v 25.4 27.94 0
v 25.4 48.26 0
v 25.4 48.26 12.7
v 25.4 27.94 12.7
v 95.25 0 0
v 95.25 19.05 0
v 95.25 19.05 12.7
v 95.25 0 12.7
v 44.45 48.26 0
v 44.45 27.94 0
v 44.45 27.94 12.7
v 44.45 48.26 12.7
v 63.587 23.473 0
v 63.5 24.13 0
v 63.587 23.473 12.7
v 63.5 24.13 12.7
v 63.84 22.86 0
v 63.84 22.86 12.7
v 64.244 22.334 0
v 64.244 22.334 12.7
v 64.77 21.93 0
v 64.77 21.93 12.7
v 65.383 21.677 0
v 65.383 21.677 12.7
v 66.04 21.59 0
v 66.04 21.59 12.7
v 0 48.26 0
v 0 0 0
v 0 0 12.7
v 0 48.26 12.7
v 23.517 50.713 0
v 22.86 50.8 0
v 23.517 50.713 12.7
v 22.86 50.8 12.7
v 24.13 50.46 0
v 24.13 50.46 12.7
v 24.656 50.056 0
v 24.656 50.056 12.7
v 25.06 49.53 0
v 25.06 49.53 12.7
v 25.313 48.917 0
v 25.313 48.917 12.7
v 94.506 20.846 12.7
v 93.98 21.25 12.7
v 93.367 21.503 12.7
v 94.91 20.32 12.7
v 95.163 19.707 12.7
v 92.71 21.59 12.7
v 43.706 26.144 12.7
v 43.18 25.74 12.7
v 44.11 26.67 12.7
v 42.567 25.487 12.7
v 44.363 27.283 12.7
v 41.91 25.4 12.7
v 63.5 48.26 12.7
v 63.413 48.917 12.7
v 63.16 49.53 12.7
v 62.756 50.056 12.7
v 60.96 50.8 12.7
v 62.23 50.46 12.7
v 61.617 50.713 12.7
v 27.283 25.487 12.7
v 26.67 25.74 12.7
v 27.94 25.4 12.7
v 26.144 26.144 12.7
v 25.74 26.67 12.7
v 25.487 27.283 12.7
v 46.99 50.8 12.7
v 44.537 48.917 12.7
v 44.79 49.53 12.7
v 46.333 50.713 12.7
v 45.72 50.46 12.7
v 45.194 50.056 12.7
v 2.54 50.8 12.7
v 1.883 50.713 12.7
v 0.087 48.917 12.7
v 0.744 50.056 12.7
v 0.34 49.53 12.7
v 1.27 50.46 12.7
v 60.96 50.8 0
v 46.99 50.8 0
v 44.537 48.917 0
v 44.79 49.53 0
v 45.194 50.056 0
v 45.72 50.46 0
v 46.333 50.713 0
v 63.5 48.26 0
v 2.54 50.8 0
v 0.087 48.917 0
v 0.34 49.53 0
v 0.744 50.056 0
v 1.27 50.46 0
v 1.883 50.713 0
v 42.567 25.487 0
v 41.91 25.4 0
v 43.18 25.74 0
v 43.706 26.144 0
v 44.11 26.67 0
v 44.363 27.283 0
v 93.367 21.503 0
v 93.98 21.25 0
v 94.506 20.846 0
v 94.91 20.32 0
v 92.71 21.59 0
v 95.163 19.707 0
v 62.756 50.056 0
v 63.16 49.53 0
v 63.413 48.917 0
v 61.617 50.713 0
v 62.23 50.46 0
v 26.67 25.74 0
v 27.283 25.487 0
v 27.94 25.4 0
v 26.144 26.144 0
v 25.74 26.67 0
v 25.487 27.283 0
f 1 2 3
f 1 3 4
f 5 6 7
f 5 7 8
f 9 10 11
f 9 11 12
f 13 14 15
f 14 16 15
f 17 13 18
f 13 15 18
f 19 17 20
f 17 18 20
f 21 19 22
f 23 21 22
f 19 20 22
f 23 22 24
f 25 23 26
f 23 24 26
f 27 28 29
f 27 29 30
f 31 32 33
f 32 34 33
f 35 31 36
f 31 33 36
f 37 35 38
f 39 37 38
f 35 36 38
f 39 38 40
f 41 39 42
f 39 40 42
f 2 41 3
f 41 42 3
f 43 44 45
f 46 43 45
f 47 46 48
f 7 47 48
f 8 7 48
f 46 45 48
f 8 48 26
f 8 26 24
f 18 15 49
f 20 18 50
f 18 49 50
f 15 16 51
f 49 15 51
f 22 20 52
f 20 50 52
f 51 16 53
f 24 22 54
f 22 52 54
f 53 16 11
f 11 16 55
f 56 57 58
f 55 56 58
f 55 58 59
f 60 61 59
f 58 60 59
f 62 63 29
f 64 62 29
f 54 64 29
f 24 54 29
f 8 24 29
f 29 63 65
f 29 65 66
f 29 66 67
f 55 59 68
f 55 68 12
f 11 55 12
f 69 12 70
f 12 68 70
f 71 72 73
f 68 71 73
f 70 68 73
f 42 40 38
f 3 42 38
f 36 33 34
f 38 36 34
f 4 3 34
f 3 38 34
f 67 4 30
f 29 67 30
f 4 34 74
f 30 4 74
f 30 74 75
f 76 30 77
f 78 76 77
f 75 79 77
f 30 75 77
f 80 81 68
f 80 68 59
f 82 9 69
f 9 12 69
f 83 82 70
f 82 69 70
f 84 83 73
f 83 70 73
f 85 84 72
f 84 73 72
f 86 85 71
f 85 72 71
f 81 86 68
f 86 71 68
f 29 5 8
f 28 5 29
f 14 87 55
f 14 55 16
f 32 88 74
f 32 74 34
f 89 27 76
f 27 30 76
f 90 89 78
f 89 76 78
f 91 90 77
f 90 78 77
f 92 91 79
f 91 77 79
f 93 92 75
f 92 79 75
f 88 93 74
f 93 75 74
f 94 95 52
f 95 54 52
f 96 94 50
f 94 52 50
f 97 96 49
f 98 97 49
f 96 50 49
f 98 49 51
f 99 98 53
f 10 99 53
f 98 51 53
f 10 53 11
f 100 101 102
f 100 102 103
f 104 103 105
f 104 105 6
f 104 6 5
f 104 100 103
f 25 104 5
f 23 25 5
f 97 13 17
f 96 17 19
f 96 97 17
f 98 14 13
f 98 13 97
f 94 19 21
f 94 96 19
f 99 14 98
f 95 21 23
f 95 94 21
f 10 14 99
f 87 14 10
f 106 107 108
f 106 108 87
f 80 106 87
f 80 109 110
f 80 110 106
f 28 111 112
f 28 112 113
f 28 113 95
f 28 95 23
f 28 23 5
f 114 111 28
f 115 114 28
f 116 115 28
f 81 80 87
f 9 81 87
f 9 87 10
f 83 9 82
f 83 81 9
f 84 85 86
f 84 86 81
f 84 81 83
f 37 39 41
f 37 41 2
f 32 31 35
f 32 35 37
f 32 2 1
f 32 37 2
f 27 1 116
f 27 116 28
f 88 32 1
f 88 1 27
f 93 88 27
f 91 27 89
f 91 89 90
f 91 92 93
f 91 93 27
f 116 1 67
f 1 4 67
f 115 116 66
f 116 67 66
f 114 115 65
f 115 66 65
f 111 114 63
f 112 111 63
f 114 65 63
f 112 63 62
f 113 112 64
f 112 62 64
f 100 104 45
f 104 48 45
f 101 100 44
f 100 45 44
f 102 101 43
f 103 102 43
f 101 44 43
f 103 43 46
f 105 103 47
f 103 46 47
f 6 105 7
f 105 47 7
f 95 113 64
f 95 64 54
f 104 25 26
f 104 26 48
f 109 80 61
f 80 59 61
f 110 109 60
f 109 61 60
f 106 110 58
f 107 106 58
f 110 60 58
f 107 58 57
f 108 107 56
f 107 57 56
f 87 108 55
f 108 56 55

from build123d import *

# Parameters (mm, degrees)
BOSS_EXTRUDE1_DEPTH = 12.7
FILLET1_R           = 2.54


with BuildPart() as part:
    # Sketch1 → Boss-Extrude1 (new body)
    with BuildSketch(Plane.XY):
        Polygon((0, 0), (0, 50.8), (25.4, 50.8), (25.4, 25.4), (44.45, 25.4), (44.45, 50.8), (63.5, 50.8), (63.5, 21.59), (95.25, 21.59), (95.25, 0), align=None)
    extrude(amount=BOSS_EXTRUDE1_DEPTH)

    # Fillet1
    fillet1_edges = [part.edges().sort_by_distance(p)[0] for p in [
        (0, 50.8, 6.35),
        (25.4, 50.8, 6.35),
        (25.4, 25.4, 6.35),
        (44.45, 25.4, 6.35),
        (44.45, 50.8, 6.35),
        (63.5, 50.8, 6.35),
        (63.5, 21.59, 6.35),
        (95.25, 21.59, 6.35),
    ]]
    fillet(fillet1_edges, radius=FILLET1_R)


solid = part.part
